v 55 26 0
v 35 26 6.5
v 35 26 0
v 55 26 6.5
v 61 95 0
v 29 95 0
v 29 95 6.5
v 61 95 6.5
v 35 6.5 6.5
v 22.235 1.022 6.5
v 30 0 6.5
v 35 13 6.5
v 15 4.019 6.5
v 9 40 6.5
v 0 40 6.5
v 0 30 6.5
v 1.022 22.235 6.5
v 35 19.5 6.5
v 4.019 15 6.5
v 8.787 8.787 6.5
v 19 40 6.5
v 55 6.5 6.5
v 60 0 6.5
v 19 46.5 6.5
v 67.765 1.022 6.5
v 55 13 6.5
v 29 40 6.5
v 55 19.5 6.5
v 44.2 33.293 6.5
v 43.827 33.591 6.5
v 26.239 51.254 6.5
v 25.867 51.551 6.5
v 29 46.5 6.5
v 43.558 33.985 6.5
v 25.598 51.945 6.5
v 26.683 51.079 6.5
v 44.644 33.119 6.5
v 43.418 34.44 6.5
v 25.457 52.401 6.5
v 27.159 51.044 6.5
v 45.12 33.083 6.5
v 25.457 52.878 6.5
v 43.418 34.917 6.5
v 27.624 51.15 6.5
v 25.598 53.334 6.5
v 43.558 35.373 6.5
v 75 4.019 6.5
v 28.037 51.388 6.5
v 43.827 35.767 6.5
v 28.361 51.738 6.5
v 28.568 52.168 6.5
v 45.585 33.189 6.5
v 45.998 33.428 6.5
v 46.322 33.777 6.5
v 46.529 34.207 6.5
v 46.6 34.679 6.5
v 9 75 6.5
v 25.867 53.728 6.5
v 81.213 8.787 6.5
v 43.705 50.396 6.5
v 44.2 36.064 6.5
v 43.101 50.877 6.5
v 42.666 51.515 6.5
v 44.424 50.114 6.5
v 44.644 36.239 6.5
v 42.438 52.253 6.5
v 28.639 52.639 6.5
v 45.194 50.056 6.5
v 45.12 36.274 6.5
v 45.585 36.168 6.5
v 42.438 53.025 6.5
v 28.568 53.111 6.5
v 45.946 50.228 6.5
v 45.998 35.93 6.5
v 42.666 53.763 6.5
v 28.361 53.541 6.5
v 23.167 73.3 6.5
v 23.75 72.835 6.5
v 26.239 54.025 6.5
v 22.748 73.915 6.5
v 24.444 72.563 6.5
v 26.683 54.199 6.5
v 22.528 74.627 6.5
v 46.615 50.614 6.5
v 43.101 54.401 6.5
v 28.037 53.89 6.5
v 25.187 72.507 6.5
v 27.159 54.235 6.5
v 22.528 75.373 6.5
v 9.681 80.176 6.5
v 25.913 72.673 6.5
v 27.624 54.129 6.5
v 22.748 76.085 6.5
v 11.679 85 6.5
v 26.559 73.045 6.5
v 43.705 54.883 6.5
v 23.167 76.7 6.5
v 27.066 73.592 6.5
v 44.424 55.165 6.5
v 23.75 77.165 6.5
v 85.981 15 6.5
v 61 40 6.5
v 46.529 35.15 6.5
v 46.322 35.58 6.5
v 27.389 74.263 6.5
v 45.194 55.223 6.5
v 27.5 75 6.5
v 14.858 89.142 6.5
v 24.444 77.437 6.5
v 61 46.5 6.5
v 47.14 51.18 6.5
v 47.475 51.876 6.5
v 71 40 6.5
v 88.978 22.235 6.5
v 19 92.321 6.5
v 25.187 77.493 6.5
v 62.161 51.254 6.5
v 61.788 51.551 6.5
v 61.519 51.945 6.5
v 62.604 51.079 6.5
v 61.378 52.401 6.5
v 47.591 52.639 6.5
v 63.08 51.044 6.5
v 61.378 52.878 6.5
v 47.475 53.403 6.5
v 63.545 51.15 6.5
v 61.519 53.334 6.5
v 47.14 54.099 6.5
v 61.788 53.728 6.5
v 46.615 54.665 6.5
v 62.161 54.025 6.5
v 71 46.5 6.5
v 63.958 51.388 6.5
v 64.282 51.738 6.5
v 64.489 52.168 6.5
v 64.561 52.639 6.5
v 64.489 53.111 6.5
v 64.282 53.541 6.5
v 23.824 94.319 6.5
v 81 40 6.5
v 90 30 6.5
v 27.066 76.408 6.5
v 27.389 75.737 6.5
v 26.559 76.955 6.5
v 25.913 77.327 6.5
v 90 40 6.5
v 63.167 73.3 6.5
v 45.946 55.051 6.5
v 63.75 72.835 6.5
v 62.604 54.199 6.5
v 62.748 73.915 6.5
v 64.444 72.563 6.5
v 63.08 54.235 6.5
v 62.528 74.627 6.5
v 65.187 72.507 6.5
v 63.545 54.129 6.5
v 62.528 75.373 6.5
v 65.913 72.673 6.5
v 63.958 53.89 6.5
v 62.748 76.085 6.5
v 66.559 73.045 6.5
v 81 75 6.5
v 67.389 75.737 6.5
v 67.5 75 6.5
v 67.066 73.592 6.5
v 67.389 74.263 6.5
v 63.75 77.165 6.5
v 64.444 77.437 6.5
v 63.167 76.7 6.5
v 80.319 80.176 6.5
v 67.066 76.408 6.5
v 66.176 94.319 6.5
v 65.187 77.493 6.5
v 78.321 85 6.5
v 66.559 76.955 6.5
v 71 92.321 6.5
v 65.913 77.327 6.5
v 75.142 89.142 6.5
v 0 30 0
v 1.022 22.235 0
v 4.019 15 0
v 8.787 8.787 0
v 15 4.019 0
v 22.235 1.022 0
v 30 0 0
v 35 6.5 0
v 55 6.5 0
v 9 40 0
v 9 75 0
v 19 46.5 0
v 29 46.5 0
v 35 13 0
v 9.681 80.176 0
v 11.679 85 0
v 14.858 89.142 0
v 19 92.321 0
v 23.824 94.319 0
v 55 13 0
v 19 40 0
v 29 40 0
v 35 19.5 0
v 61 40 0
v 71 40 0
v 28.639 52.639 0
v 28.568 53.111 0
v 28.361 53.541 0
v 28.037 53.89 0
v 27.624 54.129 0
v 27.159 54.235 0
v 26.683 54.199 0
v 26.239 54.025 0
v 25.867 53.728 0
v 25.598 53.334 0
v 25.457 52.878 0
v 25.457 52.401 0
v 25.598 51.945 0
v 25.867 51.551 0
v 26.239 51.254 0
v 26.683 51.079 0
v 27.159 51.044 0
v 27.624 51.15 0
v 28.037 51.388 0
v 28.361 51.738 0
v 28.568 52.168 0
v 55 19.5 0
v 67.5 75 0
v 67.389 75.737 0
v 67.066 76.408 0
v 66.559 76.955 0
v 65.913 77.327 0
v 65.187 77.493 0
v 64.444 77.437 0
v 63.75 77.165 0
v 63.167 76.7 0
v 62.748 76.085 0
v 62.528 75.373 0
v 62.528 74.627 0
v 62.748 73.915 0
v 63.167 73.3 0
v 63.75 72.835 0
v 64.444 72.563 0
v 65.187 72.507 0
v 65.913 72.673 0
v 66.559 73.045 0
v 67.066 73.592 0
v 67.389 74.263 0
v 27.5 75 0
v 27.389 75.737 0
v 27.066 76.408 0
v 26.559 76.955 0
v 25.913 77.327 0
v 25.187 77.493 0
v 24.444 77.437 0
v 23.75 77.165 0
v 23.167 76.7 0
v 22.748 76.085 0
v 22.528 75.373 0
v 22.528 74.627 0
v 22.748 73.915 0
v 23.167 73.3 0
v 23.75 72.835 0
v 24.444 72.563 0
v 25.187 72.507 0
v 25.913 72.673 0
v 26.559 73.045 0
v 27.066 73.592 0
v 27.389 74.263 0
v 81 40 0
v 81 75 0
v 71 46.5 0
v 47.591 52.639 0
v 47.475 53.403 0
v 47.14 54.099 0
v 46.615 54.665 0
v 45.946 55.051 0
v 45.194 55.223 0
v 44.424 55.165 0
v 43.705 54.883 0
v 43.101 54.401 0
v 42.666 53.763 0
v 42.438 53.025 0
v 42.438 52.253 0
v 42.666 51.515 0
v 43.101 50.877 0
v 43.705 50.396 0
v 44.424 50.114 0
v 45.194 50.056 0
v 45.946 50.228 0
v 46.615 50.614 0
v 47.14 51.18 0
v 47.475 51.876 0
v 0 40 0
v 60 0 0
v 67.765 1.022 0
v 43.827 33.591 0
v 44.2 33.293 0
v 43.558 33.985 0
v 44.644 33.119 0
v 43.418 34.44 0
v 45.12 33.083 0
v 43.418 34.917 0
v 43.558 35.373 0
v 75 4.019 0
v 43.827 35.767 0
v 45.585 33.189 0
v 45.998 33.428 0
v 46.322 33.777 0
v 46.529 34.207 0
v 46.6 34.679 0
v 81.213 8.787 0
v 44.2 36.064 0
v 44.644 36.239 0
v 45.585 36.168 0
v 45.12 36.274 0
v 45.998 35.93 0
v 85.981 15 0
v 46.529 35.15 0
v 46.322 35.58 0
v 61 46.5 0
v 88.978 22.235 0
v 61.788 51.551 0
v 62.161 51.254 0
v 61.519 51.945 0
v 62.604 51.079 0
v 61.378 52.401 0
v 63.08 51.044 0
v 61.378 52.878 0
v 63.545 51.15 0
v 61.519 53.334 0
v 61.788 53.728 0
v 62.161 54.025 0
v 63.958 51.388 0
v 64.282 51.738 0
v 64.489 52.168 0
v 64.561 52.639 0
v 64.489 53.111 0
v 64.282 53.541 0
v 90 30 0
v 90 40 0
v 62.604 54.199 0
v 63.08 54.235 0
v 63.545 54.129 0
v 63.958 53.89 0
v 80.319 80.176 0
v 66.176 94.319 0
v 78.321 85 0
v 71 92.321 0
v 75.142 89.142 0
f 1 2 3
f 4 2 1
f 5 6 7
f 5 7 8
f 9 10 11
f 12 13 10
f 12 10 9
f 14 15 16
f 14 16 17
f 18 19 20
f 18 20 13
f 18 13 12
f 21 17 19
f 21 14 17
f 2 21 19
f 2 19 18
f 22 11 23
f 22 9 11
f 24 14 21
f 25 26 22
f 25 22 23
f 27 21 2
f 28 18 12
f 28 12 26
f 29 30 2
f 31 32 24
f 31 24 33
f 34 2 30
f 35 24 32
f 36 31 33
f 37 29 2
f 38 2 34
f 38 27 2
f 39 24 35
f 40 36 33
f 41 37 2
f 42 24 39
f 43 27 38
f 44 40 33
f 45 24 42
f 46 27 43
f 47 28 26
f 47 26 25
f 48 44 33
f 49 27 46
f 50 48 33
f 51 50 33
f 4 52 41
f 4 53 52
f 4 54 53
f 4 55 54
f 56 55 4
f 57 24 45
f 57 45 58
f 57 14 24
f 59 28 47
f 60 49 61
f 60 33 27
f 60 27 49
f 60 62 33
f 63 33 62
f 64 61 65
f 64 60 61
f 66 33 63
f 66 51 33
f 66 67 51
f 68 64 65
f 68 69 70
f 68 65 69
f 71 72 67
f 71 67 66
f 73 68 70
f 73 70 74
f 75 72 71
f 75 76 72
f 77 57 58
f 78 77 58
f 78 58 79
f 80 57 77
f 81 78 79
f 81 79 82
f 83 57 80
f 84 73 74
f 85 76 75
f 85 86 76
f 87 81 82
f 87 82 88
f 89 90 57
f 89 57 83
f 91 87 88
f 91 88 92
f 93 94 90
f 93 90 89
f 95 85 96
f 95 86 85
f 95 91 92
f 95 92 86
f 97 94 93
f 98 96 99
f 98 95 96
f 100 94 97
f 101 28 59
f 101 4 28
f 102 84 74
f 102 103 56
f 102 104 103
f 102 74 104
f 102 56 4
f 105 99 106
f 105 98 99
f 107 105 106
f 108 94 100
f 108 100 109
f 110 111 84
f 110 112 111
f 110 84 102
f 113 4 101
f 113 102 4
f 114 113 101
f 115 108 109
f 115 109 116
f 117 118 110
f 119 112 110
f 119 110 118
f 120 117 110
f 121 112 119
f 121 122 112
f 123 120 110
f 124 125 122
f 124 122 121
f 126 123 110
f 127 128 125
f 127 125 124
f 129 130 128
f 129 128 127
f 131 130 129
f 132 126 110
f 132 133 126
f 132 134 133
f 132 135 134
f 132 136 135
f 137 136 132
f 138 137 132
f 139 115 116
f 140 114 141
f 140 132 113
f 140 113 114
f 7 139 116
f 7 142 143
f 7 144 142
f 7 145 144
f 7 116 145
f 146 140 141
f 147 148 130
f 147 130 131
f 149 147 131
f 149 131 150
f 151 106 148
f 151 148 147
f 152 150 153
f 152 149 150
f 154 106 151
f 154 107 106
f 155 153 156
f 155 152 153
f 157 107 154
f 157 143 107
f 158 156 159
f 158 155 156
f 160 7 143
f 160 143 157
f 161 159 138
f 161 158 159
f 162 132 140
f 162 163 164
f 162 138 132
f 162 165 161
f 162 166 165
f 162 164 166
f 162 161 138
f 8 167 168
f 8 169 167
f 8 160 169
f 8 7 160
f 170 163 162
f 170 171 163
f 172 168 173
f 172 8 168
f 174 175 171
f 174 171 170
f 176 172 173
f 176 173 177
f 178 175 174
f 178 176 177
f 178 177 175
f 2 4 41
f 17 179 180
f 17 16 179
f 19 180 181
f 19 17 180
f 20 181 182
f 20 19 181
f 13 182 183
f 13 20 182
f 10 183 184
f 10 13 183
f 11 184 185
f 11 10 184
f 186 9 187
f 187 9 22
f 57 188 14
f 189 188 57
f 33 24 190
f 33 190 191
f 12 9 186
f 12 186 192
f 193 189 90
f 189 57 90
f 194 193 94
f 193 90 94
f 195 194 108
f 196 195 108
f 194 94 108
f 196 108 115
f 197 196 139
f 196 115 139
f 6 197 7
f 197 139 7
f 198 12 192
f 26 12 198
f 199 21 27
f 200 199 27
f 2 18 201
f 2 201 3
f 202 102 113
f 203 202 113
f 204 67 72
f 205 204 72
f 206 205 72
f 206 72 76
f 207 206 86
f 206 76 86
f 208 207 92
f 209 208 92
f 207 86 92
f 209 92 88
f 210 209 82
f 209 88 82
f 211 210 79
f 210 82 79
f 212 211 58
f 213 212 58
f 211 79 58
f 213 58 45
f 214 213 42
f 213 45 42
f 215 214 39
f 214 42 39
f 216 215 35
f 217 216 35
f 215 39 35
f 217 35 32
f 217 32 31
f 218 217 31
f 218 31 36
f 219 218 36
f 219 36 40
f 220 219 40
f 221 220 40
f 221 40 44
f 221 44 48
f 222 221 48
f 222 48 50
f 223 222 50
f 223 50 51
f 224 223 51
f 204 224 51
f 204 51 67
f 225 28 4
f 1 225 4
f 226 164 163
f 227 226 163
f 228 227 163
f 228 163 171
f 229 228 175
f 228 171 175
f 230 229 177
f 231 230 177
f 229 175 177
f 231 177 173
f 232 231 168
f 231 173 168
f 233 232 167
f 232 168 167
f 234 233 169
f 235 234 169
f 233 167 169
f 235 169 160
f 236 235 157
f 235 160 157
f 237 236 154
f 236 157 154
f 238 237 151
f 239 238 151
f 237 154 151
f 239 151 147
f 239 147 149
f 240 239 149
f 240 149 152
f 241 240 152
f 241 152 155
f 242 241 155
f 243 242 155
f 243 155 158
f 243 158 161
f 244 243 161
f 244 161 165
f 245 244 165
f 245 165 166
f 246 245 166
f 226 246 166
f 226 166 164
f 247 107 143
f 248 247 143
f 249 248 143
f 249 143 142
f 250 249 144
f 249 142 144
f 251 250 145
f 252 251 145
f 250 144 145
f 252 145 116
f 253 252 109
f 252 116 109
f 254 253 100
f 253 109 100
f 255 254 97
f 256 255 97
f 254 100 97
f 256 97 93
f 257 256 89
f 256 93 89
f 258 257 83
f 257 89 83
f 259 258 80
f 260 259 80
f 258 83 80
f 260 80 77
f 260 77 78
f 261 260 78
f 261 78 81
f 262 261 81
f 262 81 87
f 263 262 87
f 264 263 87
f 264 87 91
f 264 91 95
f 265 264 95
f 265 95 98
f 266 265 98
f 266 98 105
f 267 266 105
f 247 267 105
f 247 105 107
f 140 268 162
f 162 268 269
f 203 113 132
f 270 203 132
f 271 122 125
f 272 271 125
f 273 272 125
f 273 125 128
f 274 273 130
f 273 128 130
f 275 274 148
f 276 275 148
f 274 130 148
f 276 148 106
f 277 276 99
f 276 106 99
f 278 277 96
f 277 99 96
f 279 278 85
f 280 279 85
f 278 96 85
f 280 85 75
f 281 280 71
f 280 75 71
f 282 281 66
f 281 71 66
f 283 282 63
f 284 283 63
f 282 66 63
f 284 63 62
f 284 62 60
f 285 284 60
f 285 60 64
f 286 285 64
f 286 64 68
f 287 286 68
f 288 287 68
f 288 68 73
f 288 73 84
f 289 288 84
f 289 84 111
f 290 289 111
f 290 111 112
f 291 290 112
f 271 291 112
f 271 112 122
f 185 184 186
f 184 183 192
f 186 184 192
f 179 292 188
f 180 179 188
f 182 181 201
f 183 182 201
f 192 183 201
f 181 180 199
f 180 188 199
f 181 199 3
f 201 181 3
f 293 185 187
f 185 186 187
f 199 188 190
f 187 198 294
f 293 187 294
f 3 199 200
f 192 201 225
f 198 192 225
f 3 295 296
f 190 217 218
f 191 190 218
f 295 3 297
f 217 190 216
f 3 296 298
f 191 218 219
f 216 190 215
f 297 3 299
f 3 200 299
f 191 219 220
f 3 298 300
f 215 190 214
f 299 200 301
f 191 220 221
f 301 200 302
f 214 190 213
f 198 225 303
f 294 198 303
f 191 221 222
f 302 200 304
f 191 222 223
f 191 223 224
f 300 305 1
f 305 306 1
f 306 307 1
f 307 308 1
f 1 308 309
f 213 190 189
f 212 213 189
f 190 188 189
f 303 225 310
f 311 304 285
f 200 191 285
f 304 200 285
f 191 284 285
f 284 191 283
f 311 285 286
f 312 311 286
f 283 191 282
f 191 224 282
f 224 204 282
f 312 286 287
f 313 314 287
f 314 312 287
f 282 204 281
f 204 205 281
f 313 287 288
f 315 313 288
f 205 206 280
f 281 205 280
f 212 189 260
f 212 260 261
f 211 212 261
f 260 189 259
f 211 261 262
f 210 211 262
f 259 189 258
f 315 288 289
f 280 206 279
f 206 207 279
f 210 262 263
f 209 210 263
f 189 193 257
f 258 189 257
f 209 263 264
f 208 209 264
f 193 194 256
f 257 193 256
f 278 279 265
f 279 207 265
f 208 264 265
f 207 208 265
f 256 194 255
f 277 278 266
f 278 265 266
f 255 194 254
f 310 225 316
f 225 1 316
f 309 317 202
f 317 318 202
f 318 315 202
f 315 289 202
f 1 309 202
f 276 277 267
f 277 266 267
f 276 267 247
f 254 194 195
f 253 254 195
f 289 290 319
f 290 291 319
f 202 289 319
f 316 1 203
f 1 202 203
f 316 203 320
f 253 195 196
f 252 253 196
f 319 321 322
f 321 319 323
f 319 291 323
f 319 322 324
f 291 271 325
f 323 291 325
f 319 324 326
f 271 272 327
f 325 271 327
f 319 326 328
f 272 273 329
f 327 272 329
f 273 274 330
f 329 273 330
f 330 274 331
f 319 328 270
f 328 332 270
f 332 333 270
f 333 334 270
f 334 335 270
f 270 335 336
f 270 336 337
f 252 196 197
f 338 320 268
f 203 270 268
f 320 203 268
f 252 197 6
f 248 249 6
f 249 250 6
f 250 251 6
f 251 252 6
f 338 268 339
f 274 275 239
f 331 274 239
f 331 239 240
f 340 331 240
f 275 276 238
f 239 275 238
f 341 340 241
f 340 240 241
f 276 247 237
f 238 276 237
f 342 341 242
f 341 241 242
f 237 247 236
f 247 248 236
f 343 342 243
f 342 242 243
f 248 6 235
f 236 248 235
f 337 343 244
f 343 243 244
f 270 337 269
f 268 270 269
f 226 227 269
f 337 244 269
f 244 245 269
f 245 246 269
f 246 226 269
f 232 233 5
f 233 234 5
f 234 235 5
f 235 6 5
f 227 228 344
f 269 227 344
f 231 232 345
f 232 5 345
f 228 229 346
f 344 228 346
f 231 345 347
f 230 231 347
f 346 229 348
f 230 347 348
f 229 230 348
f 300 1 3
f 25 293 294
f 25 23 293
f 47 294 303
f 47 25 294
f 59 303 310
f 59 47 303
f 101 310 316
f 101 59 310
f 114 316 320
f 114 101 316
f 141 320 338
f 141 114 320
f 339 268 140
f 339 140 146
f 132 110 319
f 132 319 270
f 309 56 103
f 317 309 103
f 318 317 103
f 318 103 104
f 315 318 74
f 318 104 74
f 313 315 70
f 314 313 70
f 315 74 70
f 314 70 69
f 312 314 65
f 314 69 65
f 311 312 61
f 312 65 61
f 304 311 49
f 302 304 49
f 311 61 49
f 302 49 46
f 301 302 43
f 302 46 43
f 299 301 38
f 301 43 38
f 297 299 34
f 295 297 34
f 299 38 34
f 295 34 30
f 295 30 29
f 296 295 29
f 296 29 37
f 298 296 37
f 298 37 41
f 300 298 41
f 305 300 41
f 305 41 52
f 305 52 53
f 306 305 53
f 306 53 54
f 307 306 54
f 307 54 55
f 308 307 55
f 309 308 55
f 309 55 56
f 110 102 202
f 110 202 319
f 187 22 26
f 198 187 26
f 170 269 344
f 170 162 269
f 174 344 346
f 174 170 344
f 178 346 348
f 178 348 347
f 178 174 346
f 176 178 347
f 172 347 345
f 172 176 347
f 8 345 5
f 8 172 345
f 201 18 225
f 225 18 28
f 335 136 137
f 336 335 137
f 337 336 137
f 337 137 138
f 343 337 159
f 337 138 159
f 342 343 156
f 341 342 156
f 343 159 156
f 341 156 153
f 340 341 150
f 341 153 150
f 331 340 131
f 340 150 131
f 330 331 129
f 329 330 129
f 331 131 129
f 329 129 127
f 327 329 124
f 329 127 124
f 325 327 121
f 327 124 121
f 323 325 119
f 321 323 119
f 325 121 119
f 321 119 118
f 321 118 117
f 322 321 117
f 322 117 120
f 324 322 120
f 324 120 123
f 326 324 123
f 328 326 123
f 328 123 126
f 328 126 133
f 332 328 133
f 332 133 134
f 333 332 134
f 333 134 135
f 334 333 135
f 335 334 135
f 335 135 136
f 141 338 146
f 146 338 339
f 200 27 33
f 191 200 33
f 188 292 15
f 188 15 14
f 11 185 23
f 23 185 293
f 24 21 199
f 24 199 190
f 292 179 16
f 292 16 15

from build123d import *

# Parameters (mm, degrees)
BOSS_EXTRUDE1_DEPTH = 6.5
FILLET1_R           = 20
FILLET2_R           = 30
SKETCH2_R           = 1.6
SKETCH2_R_2         = 2.5
SKETCH2_R_3         = 2.59056518
MOUNT_HOLES_DEPTH   = 132.02385279
SIDEWHEEL_CUT_REACH = 133.024
SKETCH3_W           = 10
SKETCH3_H           = 6.5
SKETCH4_W           = 20
SKETCH4_H           = 6.5
CROSSBAR_CUT_DEPTH  = 132.02385279


with BuildPart() as part:
    # Sketch1 → Boss-Extrude1 (new body)
    with BuildSketch(Plane.XY):
        Polygon((0, 40), (0, 0), (90, 0), (90, 40), (81, 40), (81, 95), (9, 95), (9, 40), align=None)
    extrude(amount=BOSS_EXTRUDE1_DEPTH)

    # Fillet1
    fillet1_edges = [part.edges().sort_by_distance(p)[0] for p in [
        (81, 95, 3.25),
        (9, 95, 3.25),
    ]]
    fillet(fillet1_edges, radius=FILLET1_R)

    # Fillet2
    fillet2_edges = [part.edges().sort_by_distance(p)[0] for p in [
        (90, 0, 3.25),
        (0, 0, 3.25),
    ]]
    fillet(fillet2_edges, radius=FILLET2_R)

    # Sketch2 → mount holes (cut, through all)
    with BuildSketch(Plane.XY.offset(6.5)):
        with Locations((62.960512242, 52.639320225)):
            Circle(SKETCH2_R)
        with Locations((27.039487758, 52.639320225)):
            Circle(SKETCH2_R)
        with Locations((45, 34.678807983)):
            Circle(SKETCH2_R)
        with Locations((25, 75)):
            Circle(SKETCH2_R_2)
        with Locations((65, 75)):
            Circle(SKETCH2_R_2)
        with Locations((45, 52.639320225)):
            Circle(SKETCH2_R_3)
    extrude(amount=-MOUNT_HOLES_DEPTH, mode=Mode.SUBTRACT)

    # Sketch3 → sidewheel cut (cut, up to next)
    with BuildSketch(Plane.XY.offset(6.5), mode=Mode.PRIVATE) as sidewheel_cut_sk1:
        with Locations((24, 43.25)):
            Rectangle(SKETCH3_W, SKETCH3_H)
    sidewheel_cut_tool1 = extrude(sidewheel_cut_sk1.sketch, amount=-SIDEWHEEL_CUT_REACH, mode=Mode.PRIVATE) & part.part
    # Sketch3 → sidewheel cut (cut, up to next)
    with BuildSketch(Plane.XY.offset(6.5), mode=Mode.PRIVATE) as sidewheel_cut_sk2:
        with Locations((66, 43.25)):
            Rectangle(SKETCH3_W, SKETCH3_H)
    sidewheel_cut_tool2 = extrude(sidewheel_cut_sk2.sketch, amount=-SIDEWHEEL_CUT_REACH, mode=Mode.PRIVATE) & part.part
    add(sidewheel_cut_tool1.solids().sort_by_distance((24, 43.25, 6.5))[0], mode=Mode.SUBTRACT)
    add(sidewheel_cut_tool2.solids().sort_by_distance((66, 43.25, 6.5))[0], mode=Mode.SUBTRACT)

    # Sketch4 → crossbar cut (cut, through all)
    with BuildSketch(Plane.XY.offset(6.5)):
        with Locations((45, 22.75)):
            Rectangle(SKETCH4_W, SKETCH4_H)
        with Locations((45, 9.75)):
            Rectangle(SKETCH4_W, SKETCH4_H)
    extrude(amount=-CROSSBAR_CUT_DEPTH, mode=Mode.SUBTRACT)


solid = part.part
